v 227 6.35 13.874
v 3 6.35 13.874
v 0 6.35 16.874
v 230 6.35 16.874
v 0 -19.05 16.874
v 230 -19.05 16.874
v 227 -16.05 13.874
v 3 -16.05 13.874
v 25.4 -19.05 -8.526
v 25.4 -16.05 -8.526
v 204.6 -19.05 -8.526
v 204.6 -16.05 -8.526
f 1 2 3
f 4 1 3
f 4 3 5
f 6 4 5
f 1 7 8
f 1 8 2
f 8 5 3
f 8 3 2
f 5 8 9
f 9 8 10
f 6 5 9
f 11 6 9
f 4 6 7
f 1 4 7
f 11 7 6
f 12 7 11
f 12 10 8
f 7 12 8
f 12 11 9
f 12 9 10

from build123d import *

# Parameters (mm, degrees)
SALIENTE_EXTRUIR1_DEPTH = 230
CORTAR_EXTRUIR1_DEPTH   = 75


with BuildPart() as part:
    # Croquis1 → Saliente-Extruir1 (new body)
    with BuildSketch(Plane(origin=(0, 0, 0), x_dir=(0, 0, -1), z_dir=(1, 0, 0))):
        Polygon((-16.874298957, 6.35), (-16.874298957, -19.05), (8.525701043, -19.05), (8.525701043, -16.05), (-13.874298957, -16.05), (-13.874298957, 6.35), align=None)
    extrude(amount=SALIENTE_EXTRUIR1_DEPTH)

    # Croquis2 → Cortar-Extruir1 (cut)
    with BuildSketch(Plane(origin=(0, 6.35, 0), x_dir=(1, 0, 0), z_dir=(0, 1, 0))):
        Polygon((0, -16.874298957), (25.4, 8.525701043), (0, 8.525701043), align=None)
        Polygon((230, -16.874298957), (204.6, 8.525701043), (230, 8.525701043), align=None)
    extrude(amount=-CORTAR_EXTRUIR1_DEPTH, mode=Mode.SUBTRACT)


solid = part.part
